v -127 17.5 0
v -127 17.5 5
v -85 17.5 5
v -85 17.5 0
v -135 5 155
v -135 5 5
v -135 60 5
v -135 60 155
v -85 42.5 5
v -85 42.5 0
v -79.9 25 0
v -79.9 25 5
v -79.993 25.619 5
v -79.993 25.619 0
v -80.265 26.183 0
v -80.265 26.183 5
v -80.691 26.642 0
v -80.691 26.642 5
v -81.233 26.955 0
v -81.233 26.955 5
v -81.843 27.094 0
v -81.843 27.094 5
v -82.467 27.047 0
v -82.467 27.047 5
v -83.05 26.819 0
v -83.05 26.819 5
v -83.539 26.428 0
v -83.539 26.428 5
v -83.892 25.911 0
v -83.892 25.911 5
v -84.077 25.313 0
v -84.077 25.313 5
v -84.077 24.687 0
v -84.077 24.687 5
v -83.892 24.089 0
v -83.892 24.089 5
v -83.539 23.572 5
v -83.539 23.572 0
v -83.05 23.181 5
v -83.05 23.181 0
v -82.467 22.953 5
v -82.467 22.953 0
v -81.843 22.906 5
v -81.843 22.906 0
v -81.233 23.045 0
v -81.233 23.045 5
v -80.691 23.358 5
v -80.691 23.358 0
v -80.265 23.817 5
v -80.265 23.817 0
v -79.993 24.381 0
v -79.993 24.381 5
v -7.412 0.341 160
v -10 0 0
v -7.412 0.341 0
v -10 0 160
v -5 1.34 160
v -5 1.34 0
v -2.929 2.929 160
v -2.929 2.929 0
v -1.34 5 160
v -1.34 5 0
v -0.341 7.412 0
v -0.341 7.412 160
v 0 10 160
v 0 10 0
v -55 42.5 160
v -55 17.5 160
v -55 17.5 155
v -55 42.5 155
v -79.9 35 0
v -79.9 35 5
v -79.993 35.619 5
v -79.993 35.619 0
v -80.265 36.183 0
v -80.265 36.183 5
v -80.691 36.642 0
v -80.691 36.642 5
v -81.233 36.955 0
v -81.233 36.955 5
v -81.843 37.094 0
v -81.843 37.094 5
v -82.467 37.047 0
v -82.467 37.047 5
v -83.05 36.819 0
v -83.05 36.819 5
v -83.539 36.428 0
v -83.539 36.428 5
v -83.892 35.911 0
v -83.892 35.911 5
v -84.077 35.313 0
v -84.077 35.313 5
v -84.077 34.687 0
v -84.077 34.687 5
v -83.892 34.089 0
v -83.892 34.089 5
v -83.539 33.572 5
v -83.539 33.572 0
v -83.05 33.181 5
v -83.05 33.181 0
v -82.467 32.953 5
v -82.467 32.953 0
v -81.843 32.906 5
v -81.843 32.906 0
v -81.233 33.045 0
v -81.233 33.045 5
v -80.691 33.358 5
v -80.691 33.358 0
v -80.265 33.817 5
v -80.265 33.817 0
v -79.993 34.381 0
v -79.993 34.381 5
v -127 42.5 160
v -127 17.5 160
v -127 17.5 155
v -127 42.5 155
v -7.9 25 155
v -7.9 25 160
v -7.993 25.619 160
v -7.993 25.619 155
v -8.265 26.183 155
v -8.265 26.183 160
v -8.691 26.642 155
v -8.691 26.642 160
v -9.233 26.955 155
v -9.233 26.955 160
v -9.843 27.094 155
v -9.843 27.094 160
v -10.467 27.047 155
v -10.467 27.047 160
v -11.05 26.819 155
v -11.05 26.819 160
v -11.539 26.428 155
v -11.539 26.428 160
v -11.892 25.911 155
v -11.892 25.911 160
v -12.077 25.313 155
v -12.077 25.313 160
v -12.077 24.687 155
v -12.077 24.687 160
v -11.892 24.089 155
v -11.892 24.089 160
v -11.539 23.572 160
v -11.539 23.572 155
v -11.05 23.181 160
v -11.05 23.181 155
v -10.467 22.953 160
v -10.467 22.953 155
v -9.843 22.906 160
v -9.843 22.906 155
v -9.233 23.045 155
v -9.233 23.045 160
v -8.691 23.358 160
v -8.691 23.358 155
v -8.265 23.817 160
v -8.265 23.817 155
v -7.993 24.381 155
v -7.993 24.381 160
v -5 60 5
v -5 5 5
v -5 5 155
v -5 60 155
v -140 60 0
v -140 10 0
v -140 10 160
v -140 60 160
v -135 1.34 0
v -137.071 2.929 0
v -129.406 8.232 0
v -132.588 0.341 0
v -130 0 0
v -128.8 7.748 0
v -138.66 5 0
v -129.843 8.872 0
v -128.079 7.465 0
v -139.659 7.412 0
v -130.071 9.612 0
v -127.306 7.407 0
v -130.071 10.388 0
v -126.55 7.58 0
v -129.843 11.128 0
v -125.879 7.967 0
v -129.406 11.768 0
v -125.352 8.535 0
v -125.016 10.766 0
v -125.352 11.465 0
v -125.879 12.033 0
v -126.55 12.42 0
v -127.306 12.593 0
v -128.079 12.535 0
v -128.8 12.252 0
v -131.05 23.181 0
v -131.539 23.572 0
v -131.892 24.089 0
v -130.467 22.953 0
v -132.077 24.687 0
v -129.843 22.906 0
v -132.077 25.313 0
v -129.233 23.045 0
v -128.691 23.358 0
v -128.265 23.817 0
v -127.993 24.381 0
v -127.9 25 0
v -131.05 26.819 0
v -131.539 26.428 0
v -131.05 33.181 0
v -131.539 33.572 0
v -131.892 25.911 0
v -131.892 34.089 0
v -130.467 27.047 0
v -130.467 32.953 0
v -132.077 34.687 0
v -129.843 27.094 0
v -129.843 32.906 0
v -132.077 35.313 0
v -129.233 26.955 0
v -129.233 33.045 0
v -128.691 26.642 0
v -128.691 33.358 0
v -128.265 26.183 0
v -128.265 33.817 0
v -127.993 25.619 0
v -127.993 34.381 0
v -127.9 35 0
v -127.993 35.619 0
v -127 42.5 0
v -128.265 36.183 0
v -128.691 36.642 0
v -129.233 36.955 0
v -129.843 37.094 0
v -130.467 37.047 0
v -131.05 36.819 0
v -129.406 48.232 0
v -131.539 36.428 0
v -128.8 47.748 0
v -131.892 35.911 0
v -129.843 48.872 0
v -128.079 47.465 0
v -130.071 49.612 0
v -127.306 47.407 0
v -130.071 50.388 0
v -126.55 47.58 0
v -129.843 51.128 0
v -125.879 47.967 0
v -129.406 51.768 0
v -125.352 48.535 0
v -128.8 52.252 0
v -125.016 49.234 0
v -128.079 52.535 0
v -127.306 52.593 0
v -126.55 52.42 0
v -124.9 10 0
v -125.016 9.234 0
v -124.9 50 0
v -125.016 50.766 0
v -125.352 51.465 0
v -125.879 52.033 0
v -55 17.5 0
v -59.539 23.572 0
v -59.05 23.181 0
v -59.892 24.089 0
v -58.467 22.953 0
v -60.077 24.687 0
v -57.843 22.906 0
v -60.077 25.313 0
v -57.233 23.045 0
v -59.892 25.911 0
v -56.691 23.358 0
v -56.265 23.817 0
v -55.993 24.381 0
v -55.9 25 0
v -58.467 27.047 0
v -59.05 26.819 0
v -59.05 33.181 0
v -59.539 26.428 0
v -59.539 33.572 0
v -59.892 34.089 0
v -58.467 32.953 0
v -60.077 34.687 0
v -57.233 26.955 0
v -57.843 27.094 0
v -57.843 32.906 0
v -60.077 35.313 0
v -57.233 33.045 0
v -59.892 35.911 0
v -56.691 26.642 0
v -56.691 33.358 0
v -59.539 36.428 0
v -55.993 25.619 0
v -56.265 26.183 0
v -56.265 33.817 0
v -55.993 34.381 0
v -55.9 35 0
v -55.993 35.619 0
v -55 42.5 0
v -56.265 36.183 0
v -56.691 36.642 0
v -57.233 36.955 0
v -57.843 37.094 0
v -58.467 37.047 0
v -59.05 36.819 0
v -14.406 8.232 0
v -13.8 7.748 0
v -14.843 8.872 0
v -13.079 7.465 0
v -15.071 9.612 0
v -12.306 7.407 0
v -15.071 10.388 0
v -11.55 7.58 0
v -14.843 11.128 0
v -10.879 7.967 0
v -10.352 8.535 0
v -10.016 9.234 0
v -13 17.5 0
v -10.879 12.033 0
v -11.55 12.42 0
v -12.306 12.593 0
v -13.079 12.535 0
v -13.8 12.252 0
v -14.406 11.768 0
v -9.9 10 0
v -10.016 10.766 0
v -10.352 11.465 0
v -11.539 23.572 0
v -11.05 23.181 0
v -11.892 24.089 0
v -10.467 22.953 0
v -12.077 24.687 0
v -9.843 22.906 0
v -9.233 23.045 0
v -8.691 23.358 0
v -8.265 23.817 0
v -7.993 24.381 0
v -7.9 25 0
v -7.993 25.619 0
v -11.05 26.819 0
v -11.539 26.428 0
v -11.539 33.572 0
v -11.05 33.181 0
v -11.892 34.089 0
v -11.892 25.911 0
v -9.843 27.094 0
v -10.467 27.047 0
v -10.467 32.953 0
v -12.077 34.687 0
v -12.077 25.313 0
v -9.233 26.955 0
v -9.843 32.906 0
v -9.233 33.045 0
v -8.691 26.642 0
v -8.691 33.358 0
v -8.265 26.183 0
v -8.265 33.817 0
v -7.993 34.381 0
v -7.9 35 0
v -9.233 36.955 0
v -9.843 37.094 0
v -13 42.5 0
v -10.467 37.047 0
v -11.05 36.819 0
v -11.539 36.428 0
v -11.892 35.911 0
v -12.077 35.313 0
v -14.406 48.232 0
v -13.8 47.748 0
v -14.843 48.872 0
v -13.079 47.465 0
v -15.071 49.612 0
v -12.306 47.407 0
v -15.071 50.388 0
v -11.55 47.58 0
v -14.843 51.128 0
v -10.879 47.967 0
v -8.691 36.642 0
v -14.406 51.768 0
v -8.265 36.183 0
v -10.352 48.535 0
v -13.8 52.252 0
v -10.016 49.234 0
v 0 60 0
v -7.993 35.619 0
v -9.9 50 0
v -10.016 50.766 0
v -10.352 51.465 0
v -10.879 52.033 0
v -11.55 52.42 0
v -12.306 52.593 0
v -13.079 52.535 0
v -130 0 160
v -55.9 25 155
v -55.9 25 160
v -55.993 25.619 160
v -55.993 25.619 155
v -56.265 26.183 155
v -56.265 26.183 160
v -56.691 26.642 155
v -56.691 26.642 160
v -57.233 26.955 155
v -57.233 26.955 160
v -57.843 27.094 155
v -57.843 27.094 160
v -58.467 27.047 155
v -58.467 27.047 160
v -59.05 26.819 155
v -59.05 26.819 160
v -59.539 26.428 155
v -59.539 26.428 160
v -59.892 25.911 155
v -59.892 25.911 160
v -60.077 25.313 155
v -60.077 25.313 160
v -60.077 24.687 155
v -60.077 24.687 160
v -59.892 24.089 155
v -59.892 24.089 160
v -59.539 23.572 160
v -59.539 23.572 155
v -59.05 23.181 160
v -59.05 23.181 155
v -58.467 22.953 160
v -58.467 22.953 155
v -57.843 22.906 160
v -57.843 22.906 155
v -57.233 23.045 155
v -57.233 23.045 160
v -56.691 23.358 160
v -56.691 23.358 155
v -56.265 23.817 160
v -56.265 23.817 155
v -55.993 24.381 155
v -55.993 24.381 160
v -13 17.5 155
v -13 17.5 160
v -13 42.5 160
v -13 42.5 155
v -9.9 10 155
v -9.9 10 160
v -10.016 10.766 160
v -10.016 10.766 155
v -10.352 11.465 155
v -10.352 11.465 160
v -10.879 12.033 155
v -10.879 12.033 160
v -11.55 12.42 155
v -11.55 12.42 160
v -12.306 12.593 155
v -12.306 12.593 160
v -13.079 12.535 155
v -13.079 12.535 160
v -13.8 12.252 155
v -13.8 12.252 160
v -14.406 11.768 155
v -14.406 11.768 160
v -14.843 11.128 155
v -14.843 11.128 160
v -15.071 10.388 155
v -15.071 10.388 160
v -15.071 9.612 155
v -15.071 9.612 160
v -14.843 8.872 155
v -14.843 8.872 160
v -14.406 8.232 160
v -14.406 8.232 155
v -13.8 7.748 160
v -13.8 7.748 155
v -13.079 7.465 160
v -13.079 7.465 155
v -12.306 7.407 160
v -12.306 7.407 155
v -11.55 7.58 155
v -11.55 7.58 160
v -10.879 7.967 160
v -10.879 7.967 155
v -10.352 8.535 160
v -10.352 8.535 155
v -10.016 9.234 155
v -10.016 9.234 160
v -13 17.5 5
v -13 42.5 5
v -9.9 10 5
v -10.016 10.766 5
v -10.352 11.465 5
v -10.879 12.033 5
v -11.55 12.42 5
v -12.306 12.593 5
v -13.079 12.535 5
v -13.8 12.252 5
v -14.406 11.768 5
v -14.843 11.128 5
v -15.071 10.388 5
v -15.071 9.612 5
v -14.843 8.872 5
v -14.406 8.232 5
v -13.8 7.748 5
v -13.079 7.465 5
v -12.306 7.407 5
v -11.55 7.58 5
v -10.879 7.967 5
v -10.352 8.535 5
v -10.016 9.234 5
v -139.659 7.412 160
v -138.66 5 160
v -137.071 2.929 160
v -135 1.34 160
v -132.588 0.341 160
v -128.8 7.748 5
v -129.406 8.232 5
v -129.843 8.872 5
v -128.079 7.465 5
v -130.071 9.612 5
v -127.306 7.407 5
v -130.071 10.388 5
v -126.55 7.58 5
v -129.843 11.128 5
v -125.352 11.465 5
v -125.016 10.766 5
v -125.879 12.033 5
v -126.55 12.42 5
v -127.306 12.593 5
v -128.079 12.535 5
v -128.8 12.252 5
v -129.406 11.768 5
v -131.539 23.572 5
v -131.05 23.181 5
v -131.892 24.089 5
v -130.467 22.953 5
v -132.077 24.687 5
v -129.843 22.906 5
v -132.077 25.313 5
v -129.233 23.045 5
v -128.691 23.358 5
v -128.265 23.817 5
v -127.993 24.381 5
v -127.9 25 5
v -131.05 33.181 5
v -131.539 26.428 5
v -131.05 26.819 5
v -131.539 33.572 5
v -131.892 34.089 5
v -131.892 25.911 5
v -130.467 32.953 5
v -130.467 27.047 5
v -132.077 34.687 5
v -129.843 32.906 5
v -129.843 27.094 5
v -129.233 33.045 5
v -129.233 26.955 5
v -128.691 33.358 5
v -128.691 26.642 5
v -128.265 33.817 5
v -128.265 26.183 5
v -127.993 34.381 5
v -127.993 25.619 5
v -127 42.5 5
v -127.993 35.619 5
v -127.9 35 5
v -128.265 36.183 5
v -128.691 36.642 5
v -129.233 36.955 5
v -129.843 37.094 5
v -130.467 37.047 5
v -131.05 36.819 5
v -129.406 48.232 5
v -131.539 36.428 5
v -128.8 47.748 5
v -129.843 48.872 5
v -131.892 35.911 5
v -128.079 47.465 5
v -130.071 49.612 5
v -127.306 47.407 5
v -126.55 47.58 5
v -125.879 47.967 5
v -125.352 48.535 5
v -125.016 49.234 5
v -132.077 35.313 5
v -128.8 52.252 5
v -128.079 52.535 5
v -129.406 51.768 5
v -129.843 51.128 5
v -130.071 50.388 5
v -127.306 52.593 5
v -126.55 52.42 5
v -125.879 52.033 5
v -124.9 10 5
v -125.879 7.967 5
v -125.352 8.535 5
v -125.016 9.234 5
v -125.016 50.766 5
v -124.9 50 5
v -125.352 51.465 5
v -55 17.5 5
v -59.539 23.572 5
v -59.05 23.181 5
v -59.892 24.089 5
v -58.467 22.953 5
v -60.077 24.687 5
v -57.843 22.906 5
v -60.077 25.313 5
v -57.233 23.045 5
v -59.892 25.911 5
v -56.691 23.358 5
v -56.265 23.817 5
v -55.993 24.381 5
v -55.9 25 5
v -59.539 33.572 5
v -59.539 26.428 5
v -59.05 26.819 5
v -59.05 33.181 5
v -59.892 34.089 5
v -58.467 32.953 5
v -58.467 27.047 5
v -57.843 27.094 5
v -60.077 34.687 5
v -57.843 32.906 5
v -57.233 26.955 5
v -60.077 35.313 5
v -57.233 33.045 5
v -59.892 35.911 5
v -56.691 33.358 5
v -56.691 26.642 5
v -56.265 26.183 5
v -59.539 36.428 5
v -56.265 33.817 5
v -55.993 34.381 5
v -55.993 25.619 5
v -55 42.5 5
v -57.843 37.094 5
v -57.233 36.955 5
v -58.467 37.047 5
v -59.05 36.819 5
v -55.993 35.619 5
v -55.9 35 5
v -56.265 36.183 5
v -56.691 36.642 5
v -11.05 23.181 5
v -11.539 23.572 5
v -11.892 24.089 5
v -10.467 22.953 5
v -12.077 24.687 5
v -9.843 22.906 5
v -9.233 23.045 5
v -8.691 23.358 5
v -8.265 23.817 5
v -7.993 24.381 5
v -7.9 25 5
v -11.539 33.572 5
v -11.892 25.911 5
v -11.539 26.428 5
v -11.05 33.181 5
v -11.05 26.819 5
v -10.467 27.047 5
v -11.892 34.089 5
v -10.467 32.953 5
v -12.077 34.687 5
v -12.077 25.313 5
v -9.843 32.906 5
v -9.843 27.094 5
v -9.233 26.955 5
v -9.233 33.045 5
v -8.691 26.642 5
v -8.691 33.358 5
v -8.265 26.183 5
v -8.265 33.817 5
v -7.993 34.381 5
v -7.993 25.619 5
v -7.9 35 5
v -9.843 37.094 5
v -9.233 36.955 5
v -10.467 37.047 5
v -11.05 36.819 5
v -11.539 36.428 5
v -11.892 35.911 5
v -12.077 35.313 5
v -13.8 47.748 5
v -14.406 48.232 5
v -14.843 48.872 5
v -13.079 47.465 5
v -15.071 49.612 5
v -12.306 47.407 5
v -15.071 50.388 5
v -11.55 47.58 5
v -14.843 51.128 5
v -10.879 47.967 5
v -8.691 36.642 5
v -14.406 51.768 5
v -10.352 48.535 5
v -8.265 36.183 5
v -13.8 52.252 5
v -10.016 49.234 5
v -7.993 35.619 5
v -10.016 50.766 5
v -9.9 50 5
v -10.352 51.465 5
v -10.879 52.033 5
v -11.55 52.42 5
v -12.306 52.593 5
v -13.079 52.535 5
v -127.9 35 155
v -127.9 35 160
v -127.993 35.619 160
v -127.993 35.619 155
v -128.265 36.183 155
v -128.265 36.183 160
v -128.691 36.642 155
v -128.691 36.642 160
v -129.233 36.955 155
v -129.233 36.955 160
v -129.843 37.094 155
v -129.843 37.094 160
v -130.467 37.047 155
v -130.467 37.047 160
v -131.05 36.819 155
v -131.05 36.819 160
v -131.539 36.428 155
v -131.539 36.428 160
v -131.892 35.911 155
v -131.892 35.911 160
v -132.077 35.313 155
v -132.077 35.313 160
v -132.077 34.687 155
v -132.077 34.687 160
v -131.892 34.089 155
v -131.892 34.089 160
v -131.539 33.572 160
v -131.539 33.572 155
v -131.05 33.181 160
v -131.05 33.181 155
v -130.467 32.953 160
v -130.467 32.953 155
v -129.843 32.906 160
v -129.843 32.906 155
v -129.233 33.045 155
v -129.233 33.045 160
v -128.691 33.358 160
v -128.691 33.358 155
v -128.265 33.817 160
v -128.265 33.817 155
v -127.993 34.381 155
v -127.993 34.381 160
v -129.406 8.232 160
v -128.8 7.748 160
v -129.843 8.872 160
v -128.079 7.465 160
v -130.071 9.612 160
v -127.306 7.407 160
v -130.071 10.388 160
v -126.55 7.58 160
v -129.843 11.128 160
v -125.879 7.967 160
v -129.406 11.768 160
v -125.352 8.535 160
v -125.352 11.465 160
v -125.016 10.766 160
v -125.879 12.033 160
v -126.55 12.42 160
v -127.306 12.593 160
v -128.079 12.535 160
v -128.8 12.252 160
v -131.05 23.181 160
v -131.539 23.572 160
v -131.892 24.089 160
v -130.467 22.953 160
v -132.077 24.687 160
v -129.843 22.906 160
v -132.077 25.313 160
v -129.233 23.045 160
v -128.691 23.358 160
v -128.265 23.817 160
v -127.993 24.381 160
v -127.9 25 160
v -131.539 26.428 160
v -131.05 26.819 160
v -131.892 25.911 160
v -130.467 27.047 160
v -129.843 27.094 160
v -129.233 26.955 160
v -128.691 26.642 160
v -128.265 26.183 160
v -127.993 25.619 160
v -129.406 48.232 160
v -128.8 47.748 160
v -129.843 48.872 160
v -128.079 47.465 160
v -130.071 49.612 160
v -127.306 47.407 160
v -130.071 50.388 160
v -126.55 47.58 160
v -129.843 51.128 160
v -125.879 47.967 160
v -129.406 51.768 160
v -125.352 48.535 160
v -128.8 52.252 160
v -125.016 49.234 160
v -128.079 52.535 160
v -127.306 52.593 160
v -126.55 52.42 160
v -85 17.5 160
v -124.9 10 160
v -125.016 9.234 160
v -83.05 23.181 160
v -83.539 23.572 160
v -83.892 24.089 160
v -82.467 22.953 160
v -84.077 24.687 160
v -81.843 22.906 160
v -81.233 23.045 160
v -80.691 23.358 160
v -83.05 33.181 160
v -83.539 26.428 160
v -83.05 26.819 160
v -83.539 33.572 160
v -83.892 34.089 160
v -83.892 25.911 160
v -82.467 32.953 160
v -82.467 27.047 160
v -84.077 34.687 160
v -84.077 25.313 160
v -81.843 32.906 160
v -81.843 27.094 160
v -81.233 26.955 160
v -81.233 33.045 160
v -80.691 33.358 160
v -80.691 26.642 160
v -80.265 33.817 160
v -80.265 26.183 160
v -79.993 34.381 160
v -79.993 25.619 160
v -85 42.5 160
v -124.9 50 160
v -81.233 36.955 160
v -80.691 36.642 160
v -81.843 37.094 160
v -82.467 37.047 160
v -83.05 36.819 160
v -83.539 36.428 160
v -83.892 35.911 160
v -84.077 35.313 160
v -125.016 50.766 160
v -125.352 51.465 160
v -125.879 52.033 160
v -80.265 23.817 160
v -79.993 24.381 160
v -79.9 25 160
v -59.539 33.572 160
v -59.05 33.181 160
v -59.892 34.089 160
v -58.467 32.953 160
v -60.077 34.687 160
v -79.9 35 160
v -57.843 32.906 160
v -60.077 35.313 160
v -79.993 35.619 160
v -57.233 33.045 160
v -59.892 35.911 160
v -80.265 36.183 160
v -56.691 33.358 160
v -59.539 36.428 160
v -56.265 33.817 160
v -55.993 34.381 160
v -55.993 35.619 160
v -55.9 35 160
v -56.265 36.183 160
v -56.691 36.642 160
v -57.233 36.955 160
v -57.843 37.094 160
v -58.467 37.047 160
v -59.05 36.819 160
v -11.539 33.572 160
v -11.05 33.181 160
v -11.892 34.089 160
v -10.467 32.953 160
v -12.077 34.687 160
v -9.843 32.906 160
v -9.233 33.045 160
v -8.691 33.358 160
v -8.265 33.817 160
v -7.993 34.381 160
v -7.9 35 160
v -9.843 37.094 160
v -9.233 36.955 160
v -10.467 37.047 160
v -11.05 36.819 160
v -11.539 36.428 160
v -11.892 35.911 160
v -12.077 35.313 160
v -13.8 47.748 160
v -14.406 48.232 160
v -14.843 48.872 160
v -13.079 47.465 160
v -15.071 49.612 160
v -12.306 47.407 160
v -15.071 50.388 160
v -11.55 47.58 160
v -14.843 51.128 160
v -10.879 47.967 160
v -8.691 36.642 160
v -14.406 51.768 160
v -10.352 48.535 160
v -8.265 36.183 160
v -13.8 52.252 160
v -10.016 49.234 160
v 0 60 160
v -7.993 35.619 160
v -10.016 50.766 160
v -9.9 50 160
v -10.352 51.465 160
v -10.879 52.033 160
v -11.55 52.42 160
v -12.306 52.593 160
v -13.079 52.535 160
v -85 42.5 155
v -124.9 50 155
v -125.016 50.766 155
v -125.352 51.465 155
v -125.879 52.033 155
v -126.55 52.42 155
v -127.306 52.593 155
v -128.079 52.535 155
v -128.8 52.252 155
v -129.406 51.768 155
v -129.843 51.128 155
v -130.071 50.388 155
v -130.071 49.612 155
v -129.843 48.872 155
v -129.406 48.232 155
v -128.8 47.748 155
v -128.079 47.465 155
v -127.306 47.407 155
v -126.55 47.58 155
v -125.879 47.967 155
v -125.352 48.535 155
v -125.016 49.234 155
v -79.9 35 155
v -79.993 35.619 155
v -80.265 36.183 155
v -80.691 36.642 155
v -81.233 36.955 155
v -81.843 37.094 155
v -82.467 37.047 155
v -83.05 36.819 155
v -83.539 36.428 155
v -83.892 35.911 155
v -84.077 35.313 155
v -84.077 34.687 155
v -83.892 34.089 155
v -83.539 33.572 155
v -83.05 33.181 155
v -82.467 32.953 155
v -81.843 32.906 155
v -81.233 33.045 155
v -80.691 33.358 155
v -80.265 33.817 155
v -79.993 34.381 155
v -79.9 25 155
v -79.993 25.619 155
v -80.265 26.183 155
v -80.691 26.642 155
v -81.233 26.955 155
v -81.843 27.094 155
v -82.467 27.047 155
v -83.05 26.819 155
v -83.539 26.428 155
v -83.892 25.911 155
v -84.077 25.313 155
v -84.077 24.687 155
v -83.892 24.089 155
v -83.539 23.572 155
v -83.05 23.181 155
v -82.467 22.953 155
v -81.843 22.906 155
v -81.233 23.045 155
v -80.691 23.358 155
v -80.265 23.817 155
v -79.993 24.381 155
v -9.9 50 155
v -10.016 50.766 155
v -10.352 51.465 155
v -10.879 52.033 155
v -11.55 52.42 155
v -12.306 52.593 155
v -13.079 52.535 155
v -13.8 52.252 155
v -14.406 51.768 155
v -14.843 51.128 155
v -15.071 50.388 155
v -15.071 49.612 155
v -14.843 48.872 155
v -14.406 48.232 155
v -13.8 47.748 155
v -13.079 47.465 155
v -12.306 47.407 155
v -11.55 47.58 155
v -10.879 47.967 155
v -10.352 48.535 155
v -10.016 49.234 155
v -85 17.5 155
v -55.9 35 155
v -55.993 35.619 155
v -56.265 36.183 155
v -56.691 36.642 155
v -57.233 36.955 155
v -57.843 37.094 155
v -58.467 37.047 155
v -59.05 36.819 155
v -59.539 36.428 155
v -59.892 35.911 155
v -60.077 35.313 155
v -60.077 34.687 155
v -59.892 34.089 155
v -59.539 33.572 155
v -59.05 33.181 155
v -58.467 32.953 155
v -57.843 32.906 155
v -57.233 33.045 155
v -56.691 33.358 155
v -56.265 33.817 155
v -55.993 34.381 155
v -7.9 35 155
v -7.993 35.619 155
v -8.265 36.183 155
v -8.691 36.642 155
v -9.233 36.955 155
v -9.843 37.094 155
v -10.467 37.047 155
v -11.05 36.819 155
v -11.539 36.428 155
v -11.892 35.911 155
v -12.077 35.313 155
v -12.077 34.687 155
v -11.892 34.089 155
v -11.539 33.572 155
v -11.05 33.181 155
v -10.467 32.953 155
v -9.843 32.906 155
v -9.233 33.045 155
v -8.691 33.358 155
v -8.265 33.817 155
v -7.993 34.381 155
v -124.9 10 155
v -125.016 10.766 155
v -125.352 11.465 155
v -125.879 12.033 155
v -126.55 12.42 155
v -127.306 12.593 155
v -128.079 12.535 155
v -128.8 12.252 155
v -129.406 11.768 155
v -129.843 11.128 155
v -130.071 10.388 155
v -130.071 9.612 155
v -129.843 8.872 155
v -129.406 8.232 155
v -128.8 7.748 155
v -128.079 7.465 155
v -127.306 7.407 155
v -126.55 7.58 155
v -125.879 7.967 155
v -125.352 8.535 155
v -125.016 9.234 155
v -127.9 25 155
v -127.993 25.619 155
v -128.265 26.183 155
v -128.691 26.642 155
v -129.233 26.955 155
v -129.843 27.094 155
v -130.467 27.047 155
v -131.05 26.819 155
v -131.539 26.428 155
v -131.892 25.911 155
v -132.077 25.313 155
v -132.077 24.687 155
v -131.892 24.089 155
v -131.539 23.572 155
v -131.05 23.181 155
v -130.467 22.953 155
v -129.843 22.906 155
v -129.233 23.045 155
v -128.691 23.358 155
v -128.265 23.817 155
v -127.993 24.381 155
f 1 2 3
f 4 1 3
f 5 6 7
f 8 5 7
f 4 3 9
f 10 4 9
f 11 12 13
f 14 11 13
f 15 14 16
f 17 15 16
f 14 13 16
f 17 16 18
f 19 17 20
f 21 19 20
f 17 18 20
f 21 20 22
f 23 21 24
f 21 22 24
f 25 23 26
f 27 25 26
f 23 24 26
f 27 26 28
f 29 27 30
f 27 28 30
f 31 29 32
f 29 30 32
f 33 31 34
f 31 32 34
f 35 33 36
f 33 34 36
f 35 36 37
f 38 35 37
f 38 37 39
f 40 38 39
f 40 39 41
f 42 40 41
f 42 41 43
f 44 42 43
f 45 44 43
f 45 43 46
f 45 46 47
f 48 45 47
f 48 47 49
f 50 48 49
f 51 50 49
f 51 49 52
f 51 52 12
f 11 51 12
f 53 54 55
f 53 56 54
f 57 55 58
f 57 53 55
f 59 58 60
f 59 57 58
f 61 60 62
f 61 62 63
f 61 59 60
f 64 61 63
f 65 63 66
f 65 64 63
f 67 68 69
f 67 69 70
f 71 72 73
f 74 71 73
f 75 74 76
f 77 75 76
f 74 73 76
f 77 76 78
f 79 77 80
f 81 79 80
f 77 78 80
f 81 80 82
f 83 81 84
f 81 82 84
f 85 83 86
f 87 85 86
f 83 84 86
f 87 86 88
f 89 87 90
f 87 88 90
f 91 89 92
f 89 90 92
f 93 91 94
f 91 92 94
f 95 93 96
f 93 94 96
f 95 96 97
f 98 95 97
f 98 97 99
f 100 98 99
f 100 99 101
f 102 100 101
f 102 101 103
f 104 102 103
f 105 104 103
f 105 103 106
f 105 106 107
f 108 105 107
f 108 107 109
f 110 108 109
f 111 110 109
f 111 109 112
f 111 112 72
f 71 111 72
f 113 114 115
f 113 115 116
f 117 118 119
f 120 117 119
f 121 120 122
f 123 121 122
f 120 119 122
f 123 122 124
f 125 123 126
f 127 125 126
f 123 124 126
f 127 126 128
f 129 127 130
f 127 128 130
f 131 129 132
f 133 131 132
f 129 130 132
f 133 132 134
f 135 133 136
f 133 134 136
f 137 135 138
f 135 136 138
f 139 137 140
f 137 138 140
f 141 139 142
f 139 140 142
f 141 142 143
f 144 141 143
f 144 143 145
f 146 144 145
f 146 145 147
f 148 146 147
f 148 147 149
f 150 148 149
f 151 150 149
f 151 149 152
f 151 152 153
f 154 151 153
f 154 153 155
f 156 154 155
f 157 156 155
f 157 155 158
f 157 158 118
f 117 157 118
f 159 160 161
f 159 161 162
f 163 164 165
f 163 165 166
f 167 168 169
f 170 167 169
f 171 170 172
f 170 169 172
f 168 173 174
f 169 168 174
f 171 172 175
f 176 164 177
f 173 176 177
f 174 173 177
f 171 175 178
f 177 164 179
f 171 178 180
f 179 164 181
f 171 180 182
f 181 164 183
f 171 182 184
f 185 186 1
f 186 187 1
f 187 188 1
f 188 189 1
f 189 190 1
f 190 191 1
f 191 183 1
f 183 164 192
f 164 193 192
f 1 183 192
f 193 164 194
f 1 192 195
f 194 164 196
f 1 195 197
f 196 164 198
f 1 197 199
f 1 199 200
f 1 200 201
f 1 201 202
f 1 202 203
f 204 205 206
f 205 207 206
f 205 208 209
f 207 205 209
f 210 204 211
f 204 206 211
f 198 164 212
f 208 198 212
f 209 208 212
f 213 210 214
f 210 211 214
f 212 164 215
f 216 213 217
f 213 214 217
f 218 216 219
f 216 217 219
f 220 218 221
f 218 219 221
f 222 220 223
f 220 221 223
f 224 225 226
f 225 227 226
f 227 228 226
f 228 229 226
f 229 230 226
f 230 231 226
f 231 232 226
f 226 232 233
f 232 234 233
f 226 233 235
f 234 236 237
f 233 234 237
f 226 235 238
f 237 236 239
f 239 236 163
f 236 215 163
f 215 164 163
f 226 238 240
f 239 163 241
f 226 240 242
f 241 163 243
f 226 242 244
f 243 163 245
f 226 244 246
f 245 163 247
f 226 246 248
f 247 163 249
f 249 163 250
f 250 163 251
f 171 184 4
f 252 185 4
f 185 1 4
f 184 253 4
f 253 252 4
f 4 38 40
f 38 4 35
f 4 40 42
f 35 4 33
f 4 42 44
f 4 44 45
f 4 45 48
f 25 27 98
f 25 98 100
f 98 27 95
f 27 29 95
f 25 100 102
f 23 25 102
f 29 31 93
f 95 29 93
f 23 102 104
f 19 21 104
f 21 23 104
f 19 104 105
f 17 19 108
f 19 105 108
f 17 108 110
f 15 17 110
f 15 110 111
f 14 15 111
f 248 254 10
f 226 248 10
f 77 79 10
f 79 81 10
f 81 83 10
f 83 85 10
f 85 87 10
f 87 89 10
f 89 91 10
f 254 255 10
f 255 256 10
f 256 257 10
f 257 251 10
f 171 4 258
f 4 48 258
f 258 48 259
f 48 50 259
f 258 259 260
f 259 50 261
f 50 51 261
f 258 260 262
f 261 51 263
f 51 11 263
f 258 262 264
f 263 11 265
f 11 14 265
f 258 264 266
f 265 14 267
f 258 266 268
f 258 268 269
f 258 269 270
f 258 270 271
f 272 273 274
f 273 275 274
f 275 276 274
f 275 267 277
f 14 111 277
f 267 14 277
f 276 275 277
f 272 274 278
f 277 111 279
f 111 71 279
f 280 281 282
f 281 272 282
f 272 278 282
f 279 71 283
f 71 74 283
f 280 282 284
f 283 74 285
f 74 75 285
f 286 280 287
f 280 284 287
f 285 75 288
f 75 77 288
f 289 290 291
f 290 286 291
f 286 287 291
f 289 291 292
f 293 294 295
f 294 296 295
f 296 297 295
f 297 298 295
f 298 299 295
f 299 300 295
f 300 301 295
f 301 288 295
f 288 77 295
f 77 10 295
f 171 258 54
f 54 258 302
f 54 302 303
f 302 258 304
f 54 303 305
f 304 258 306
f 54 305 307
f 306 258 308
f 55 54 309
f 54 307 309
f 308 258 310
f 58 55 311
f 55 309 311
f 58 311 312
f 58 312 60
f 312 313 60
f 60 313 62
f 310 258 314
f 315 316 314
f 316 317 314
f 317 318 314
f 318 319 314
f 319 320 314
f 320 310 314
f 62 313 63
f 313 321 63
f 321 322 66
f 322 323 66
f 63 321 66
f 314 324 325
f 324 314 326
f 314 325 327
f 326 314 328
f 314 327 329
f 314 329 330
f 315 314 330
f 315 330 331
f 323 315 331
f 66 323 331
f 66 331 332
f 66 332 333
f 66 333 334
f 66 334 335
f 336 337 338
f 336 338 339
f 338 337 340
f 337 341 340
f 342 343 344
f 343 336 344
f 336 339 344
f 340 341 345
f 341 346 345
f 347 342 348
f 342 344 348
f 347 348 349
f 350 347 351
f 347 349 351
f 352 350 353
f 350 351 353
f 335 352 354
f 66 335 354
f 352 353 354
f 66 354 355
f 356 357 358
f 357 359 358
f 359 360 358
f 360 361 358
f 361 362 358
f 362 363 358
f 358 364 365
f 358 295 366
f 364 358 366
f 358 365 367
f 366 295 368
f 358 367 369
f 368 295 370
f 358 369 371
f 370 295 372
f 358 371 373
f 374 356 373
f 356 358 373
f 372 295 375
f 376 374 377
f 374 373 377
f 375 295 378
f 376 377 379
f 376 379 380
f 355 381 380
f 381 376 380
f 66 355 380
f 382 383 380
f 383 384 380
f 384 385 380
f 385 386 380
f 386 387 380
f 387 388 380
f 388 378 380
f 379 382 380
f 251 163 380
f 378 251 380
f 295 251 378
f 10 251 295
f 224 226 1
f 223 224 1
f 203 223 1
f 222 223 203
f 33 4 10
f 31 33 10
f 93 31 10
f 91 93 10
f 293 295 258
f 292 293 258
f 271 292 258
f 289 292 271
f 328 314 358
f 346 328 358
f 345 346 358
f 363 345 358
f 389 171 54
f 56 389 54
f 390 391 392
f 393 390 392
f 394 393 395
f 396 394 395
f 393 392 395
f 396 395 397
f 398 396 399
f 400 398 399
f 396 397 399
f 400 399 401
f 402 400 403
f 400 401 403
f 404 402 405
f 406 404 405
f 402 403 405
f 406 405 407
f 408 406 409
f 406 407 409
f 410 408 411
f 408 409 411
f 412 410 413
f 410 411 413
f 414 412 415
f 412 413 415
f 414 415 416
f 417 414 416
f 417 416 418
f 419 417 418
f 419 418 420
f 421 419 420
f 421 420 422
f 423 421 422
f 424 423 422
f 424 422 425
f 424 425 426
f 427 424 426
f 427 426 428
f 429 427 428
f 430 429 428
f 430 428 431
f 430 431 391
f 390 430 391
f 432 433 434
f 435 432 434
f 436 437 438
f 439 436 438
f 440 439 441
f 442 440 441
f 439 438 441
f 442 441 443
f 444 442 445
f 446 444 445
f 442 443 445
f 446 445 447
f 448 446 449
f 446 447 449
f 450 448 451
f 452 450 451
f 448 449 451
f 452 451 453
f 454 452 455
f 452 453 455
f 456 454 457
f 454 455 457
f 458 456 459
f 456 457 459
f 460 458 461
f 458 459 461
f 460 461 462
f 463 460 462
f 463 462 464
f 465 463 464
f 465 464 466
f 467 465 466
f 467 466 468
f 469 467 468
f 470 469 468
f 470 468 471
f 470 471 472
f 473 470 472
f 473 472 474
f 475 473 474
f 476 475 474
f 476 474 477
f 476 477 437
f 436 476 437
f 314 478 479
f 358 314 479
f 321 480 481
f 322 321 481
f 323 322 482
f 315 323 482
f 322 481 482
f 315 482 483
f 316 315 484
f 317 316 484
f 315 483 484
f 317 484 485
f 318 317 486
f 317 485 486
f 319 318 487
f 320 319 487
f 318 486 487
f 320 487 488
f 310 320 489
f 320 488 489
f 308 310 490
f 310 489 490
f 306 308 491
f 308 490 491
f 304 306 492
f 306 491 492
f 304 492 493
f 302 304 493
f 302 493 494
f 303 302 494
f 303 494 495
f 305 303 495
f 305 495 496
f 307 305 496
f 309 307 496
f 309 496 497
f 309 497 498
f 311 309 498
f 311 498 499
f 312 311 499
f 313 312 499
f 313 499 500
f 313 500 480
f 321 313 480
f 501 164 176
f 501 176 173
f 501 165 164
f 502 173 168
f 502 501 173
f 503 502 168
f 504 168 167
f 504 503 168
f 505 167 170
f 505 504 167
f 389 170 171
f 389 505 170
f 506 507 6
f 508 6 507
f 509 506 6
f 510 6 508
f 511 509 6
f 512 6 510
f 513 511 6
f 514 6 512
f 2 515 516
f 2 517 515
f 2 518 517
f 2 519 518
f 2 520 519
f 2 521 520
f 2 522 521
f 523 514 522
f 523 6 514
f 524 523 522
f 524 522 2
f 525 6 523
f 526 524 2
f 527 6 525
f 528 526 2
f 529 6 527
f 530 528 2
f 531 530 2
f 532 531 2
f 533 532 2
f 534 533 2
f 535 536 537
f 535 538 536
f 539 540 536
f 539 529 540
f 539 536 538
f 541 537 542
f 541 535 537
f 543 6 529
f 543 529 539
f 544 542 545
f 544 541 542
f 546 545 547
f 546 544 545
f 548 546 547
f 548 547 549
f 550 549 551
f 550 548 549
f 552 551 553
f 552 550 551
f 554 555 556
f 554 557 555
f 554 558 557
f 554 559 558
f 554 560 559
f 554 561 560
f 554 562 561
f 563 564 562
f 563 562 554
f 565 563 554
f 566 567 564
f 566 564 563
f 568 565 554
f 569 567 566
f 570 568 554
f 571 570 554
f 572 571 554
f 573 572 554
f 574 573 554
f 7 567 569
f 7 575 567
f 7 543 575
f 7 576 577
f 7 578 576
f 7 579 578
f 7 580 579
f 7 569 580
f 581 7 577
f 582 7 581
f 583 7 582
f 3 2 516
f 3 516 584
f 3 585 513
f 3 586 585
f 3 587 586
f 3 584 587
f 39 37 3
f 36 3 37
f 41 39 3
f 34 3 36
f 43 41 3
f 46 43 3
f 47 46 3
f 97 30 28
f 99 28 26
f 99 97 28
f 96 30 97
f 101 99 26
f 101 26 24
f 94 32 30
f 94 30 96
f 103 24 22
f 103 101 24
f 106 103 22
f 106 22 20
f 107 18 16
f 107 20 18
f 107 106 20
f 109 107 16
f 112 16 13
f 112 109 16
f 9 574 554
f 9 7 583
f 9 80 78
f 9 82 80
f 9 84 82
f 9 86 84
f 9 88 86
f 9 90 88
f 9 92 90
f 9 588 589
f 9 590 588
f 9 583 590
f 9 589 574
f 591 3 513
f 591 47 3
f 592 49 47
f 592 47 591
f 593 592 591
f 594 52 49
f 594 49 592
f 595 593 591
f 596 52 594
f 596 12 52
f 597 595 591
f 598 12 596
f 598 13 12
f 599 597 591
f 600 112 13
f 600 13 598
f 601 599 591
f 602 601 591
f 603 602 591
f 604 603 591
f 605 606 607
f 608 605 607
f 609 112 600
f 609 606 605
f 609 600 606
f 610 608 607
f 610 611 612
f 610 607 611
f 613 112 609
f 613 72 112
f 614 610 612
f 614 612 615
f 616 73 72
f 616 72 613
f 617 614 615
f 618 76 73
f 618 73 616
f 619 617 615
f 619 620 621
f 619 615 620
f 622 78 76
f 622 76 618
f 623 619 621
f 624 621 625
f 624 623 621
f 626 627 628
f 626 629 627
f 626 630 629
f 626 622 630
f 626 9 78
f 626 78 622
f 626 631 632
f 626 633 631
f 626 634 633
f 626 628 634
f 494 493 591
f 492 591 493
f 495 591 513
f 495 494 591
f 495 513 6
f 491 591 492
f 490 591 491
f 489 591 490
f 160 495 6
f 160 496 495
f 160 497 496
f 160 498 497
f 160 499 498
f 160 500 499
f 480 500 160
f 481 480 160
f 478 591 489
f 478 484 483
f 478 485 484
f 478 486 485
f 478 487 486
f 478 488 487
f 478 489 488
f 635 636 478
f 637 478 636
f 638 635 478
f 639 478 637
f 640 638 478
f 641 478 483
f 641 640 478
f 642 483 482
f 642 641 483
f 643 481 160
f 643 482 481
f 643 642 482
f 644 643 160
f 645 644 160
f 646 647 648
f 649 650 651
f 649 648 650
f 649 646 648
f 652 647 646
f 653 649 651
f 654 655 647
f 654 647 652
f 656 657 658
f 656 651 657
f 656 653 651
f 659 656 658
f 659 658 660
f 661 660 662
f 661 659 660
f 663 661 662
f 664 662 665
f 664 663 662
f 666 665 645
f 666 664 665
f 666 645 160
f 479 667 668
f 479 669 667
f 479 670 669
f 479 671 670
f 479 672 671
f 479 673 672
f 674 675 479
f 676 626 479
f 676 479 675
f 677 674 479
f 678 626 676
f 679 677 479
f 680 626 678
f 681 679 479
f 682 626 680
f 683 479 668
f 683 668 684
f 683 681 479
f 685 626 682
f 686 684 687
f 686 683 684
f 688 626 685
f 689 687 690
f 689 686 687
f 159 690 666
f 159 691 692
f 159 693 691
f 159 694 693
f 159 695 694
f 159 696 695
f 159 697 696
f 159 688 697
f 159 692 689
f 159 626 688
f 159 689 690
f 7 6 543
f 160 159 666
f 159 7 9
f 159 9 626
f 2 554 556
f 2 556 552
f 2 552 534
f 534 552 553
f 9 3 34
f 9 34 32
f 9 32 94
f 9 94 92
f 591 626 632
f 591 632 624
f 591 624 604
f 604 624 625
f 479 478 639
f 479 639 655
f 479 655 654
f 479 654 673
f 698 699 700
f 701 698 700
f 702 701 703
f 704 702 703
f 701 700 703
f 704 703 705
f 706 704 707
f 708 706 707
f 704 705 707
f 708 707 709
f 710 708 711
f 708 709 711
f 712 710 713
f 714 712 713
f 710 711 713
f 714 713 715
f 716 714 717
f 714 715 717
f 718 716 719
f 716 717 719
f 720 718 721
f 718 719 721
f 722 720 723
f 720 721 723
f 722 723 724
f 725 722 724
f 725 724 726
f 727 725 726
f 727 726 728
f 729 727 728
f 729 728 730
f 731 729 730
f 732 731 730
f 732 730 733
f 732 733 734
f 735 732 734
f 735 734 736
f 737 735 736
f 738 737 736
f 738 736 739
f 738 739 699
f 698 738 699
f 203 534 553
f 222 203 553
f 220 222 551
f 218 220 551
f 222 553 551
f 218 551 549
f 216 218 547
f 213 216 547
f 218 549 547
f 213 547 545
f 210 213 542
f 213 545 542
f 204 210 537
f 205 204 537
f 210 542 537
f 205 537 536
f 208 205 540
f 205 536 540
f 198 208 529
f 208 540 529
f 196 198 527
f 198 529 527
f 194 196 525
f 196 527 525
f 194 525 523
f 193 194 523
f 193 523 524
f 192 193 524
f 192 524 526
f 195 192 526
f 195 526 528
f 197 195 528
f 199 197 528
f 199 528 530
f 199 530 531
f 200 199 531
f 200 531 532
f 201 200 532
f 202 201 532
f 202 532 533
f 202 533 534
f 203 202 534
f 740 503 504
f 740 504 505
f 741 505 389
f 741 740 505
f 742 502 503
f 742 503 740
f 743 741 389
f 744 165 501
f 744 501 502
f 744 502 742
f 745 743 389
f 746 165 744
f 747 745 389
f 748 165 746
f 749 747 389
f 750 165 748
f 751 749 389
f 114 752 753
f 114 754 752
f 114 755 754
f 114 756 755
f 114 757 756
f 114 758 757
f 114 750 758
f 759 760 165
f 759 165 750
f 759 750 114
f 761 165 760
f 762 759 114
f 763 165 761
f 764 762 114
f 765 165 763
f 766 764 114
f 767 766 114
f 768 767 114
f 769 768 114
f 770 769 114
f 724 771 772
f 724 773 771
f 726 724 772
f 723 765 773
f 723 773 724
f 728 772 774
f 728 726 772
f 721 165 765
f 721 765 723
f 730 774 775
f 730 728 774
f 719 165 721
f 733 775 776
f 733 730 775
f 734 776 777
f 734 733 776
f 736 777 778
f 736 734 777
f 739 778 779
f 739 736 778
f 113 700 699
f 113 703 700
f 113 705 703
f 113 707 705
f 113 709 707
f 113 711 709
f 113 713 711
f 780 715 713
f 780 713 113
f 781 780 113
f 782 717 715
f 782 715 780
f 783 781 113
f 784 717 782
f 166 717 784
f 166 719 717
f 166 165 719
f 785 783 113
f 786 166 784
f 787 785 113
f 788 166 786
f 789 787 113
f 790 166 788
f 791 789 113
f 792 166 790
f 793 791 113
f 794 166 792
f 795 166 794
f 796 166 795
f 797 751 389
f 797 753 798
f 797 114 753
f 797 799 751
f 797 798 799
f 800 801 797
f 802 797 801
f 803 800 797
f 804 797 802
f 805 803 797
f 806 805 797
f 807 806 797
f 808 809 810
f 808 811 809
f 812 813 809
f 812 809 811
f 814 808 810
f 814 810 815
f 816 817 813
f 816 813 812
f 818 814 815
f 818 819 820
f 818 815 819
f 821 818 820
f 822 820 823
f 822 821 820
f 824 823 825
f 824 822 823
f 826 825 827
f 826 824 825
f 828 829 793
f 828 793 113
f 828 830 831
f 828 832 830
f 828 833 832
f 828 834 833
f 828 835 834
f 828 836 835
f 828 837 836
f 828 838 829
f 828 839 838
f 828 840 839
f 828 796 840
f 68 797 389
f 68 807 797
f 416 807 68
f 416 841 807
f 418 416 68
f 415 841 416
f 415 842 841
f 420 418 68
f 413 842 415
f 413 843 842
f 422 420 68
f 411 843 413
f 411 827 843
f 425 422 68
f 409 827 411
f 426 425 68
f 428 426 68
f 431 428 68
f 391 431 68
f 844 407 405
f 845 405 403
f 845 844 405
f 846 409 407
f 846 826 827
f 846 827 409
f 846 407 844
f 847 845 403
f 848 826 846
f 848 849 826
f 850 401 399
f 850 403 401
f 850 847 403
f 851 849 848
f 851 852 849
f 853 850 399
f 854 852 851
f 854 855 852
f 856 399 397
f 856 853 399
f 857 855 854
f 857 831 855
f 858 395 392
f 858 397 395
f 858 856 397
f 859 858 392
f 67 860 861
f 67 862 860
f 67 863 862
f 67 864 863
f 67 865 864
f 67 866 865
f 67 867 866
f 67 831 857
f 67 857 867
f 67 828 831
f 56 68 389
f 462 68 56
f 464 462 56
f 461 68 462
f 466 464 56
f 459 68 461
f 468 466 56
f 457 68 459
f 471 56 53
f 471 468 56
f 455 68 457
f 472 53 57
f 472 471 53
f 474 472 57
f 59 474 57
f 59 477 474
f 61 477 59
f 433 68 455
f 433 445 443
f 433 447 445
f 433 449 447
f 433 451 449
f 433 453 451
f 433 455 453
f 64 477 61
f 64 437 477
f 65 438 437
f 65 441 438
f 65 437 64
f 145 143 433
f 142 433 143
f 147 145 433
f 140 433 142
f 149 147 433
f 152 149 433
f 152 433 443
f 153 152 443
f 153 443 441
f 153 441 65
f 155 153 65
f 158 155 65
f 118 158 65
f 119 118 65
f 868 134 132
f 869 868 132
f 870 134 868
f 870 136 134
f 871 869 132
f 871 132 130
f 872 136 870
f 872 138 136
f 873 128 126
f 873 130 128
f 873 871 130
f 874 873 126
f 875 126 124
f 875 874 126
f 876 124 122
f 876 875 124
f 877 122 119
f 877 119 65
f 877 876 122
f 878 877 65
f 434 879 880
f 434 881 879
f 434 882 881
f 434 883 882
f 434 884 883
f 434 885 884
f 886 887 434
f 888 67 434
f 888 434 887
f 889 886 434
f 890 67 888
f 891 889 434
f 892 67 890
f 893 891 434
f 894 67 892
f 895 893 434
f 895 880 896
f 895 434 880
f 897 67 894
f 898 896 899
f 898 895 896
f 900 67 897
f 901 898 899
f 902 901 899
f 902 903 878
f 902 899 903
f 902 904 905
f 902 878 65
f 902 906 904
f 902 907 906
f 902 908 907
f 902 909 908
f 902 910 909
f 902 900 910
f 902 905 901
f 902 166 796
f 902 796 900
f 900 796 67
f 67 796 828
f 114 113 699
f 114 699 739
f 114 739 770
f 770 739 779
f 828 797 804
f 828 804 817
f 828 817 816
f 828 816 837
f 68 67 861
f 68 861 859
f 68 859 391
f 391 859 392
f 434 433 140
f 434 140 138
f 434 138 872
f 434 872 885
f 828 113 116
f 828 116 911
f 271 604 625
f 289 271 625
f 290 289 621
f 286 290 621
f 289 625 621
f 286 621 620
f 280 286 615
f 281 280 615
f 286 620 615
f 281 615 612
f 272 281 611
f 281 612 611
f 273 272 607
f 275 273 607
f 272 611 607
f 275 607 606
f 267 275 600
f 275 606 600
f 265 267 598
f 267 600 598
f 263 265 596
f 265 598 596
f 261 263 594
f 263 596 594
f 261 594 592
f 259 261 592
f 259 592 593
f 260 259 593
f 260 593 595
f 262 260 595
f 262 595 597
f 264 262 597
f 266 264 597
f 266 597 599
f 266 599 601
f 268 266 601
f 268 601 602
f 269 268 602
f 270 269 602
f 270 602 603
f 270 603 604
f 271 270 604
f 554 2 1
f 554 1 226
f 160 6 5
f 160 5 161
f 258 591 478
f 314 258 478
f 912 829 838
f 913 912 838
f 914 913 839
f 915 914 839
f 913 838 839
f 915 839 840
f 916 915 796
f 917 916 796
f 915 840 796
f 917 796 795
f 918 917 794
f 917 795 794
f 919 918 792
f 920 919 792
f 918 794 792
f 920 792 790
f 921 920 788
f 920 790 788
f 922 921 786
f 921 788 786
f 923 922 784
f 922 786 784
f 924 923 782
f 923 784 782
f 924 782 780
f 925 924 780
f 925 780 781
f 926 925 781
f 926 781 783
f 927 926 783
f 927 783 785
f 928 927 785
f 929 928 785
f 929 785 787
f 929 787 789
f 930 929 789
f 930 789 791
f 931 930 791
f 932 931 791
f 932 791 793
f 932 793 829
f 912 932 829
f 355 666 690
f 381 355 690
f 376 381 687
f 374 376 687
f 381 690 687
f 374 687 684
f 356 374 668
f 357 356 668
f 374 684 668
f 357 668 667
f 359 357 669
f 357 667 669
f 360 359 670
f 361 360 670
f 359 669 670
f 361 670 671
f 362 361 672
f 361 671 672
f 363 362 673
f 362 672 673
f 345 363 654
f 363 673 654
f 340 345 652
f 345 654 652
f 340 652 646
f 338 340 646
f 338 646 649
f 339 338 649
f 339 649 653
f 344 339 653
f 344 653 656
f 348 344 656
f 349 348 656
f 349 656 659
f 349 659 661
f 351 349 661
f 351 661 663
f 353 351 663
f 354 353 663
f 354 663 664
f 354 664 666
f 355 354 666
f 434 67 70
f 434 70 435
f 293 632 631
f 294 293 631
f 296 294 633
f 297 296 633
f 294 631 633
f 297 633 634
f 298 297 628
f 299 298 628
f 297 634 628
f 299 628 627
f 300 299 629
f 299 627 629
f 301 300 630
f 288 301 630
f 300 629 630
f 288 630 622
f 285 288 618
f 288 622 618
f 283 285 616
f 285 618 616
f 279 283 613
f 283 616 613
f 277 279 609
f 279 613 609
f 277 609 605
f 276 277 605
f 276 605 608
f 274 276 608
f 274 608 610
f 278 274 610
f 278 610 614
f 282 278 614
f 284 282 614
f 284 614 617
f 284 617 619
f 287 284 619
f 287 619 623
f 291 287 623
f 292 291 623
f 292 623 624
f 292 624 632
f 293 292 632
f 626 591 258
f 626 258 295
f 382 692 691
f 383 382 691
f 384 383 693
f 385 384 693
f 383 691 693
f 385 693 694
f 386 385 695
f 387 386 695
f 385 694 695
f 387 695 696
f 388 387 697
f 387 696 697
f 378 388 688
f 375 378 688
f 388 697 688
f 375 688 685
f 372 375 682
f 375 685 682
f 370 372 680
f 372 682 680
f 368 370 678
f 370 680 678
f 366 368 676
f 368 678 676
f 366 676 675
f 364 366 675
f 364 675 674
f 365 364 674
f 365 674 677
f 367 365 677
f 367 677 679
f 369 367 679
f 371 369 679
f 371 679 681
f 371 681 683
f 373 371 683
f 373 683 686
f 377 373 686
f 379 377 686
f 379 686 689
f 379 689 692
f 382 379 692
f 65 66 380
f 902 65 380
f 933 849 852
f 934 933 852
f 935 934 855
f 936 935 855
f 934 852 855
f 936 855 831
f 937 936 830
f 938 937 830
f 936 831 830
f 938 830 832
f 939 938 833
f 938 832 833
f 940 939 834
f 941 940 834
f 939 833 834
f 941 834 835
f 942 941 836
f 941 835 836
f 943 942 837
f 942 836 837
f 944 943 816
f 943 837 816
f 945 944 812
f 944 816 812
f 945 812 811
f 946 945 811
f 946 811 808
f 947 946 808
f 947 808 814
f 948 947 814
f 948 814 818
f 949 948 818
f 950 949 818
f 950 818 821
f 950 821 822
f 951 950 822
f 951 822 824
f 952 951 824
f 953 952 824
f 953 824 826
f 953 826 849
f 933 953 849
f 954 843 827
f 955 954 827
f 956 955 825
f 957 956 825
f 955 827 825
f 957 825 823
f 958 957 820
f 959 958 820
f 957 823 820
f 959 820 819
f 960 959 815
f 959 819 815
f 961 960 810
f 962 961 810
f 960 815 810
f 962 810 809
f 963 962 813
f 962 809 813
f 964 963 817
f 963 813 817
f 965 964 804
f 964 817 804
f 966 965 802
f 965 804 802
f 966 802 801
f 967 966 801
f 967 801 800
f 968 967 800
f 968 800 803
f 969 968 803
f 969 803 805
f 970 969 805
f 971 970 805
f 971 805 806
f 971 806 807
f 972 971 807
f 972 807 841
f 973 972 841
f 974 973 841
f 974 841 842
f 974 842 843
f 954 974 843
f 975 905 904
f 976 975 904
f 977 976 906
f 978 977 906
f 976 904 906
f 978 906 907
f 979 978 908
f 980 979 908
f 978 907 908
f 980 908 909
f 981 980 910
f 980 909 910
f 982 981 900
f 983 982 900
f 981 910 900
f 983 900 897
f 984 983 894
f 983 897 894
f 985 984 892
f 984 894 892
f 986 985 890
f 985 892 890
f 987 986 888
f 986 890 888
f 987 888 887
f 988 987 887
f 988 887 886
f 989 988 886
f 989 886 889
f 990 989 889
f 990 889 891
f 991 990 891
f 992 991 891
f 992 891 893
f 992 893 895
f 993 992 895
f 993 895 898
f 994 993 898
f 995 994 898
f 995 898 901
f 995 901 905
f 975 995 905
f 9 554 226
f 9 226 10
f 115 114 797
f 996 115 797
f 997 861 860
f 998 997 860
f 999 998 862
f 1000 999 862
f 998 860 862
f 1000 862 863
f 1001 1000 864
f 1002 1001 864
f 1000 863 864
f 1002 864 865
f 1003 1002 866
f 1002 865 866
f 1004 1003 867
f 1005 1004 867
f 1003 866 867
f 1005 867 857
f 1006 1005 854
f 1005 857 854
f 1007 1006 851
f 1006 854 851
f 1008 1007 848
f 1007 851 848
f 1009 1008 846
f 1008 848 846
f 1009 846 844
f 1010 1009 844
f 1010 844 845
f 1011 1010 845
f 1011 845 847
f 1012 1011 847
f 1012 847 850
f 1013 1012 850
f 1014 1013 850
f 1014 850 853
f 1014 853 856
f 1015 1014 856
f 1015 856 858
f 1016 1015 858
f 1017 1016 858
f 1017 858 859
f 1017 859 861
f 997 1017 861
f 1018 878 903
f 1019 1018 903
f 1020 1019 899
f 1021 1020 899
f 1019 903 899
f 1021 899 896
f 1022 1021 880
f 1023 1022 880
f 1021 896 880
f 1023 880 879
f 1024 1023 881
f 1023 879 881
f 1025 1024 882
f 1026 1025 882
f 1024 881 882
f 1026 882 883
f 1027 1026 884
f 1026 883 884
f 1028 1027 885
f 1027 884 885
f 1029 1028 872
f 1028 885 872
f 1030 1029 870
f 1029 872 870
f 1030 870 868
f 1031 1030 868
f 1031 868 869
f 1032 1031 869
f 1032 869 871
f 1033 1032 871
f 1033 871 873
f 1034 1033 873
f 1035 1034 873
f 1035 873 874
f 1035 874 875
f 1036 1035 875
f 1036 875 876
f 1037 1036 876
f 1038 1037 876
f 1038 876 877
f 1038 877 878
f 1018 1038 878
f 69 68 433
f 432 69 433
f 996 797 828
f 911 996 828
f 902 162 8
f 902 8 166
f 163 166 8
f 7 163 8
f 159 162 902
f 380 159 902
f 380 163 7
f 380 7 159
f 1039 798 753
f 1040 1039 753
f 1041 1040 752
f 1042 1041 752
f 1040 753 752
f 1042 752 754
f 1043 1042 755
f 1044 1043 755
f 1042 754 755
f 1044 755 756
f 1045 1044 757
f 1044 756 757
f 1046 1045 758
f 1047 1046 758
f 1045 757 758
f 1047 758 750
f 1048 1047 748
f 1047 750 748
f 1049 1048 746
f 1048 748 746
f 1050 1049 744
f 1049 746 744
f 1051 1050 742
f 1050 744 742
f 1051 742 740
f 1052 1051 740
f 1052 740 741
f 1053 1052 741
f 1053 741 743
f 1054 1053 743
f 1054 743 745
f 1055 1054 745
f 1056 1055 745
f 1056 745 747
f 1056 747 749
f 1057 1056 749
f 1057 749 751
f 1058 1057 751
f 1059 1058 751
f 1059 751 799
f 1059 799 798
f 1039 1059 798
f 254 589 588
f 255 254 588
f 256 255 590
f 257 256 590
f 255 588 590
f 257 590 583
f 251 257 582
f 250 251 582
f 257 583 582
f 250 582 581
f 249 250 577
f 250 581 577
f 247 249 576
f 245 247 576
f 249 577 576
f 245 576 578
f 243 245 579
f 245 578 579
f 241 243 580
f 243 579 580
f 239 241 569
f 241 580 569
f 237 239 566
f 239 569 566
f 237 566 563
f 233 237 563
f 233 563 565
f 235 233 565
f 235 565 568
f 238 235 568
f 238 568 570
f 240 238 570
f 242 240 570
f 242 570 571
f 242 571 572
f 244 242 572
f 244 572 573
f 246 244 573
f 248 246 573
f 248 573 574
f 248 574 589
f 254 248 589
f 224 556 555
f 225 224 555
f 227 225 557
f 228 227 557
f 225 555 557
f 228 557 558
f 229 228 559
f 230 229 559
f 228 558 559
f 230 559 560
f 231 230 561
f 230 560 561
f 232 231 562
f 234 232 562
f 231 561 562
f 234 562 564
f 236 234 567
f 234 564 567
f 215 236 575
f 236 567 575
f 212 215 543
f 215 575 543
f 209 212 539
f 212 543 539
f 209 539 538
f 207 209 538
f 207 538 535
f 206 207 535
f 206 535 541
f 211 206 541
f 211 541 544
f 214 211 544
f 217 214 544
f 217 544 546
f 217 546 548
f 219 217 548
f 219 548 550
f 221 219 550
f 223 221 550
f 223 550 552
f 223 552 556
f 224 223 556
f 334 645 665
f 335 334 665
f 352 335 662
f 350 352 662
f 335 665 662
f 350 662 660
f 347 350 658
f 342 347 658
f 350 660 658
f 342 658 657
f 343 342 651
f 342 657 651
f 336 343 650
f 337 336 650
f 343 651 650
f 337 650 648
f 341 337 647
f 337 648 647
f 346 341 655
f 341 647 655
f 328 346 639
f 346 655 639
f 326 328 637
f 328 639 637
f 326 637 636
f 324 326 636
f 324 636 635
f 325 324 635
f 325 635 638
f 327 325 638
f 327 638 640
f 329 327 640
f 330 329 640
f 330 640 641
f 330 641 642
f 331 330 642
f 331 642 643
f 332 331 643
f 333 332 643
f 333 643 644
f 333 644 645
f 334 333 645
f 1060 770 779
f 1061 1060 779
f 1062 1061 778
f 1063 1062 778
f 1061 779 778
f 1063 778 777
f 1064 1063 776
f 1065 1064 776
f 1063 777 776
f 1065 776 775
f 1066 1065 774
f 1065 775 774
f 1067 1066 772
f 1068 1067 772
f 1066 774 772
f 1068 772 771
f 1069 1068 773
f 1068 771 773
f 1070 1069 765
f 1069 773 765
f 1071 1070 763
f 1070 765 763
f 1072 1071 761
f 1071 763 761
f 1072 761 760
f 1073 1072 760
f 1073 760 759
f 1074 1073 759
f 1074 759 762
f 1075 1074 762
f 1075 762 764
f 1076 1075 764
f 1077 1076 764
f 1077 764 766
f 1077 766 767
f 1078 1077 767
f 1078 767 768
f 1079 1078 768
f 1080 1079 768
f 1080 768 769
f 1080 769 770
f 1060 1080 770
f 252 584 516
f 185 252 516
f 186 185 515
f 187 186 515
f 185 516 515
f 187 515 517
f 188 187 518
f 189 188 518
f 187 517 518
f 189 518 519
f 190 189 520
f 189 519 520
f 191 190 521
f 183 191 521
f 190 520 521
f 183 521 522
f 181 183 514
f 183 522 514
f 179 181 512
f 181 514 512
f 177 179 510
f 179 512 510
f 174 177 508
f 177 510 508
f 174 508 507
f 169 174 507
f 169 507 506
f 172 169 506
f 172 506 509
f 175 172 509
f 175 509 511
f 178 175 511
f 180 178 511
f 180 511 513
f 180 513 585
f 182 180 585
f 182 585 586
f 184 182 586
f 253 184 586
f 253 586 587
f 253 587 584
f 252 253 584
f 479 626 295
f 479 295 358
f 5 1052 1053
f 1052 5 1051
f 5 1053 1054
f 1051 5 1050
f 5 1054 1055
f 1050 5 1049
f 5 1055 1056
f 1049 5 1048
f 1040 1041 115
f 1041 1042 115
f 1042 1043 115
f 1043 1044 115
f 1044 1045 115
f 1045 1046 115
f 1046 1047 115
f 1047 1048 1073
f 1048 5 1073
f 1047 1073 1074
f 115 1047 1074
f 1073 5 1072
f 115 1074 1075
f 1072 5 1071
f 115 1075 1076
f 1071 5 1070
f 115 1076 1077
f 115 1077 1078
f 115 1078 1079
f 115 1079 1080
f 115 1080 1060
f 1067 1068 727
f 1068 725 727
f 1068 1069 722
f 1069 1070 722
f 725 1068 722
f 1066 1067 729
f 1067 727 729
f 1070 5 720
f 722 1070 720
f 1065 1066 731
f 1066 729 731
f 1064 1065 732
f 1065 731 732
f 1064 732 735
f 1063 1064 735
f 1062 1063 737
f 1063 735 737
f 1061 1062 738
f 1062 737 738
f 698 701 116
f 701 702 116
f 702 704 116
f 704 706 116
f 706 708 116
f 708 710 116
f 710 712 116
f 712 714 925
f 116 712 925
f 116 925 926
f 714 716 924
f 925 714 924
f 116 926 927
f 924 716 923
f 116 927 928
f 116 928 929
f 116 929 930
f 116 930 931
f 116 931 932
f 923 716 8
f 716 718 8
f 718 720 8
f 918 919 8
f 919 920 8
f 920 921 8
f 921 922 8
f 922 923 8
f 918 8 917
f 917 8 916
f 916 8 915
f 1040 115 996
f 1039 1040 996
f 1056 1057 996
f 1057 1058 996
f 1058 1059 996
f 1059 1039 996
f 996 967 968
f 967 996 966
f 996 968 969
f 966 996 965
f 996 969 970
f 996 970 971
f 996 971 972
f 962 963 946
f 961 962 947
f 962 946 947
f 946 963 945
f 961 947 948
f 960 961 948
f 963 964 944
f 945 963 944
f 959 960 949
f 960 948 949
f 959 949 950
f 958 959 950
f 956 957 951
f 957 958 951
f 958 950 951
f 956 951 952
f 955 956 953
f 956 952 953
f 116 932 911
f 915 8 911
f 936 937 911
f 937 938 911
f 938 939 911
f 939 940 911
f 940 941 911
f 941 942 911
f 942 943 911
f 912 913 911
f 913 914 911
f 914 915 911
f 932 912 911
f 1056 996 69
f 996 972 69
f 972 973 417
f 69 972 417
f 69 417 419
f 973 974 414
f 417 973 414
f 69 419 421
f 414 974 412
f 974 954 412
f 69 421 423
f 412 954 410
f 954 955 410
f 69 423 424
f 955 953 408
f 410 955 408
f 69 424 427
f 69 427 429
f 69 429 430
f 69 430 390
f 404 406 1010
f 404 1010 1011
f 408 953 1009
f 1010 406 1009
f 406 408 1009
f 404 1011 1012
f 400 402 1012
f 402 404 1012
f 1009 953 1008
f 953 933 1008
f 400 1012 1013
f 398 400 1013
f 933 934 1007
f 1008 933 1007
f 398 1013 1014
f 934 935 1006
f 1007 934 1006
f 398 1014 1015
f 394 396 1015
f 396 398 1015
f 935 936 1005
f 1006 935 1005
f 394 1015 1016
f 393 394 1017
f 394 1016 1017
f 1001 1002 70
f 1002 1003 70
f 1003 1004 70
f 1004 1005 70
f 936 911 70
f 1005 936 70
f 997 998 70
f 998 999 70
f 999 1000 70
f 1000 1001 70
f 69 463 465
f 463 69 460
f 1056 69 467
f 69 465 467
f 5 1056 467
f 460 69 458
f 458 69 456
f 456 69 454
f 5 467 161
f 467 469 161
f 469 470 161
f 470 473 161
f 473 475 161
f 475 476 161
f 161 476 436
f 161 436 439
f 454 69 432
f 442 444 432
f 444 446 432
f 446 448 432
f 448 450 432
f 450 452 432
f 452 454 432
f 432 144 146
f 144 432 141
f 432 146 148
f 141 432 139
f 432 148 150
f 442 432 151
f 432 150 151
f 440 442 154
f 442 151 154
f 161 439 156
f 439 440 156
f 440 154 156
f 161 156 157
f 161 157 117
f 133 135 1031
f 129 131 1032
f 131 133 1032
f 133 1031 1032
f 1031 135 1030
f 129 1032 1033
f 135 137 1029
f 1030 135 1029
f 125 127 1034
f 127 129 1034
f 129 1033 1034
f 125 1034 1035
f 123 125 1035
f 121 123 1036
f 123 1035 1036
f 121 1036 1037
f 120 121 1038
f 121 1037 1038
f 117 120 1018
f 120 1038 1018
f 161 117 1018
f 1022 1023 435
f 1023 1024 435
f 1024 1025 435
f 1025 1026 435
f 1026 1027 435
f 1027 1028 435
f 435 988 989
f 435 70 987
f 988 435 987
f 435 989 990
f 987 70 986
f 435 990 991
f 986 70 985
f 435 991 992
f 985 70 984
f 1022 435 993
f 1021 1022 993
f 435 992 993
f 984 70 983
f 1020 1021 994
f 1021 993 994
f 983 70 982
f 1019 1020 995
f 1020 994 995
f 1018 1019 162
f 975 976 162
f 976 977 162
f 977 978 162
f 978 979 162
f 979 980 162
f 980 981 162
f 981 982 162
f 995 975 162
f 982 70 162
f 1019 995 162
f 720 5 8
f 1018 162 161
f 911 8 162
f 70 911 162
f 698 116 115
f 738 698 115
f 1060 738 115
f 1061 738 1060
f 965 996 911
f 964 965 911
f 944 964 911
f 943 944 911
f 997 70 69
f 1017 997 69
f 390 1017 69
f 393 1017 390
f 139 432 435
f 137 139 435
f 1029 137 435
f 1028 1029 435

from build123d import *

# Parameters (mm, degrees)
SKETCH1_W           = 140
SKETCH1_H           = 60
BOSS_EXTRUDE1_DEPTH = 160
SHELL1_T            = -5
SKETCH2_R           = 2.6
SKETCH2_R_2         = 2.1
SKETCH2_W           = 42
SKETCH2_H           = 25
CUT_EXTRUDE1_DEPTH  = 161
FILLET1_R           = 10


with BuildPart() as part:
    # Sketch1 → Boss-Extrude1 (new body)
    with BuildSketch(Plane.XY):
        with Locations((-70, 30)):
            Rectangle(SKETCH1_W, SKETCH1_H)
    extrude(amount=BOSS_EXTRUDE1_DEPTH)

    # Shell1
    shell1_openings = [part.faces().sort_by_distance(p)[0] for p in [
        (-70, 60, 80),
    ]]
    offset(amount=SHELL1_T, openings=shell1_openings, kind=Kind.INTERSECTION)

    # Sketch2 → Cut-Extrude1 (cut, through all)
    with BuildSketch(Plane.XY.offset(160)):
        with Locations((-127.5, 50)):
            Circle(SKETCH2_R)
        with Locations((-127.5, 10)):
            Circle(SKETCH2_R)
        with Locations((-12.5, 10)):
            Circle(SKETCH2_R)
        with Locations((-12.5, 50)):
            Circle(SKETCH2_R)
        with Locations((-130, 35)):
            Circle(SKETCH2_R_2)
        with Locations((-130, 25)):
            Circle(SKETCH2_R_2)
        with Locations((-82, 25)):
            Circle(SKETCH2_R_2)
        with Locations((-82, 35)):
            Circle(SKETCH2_R_2)
        with Locations((-58, 25)):
            Circle(SKETCH2_R_2)
        with Locations((-58, 35)):
            Circle(SKETCH2_R_2)
        with Locations((-10, 25)):
            Circle(SKETCH2_R_2)
        with Locations((-10, 35)):
            Circle(SKETCH2_R_2)
        with Locations((-106, 30)):
            Rectangle(SKETCH2_W, SKETCH2_H)
        with Locations((-34, 30)):
            Rectangle(SKETCH2_W, SKETCH2_H)
    extrude(amount=-CUT_EXTRUDE1_DEPTH, mode=Mode.SUBTRACT)

    # Fillet1
    fillet1_edges = [part.edges().sort_by_distance(p)[0] for p in [
        (0, 0, 80),
        (-140, 0, 80),
    ]]
    fillet(fillet1_edges, radius=FILLET1_R)


solid = part.part
